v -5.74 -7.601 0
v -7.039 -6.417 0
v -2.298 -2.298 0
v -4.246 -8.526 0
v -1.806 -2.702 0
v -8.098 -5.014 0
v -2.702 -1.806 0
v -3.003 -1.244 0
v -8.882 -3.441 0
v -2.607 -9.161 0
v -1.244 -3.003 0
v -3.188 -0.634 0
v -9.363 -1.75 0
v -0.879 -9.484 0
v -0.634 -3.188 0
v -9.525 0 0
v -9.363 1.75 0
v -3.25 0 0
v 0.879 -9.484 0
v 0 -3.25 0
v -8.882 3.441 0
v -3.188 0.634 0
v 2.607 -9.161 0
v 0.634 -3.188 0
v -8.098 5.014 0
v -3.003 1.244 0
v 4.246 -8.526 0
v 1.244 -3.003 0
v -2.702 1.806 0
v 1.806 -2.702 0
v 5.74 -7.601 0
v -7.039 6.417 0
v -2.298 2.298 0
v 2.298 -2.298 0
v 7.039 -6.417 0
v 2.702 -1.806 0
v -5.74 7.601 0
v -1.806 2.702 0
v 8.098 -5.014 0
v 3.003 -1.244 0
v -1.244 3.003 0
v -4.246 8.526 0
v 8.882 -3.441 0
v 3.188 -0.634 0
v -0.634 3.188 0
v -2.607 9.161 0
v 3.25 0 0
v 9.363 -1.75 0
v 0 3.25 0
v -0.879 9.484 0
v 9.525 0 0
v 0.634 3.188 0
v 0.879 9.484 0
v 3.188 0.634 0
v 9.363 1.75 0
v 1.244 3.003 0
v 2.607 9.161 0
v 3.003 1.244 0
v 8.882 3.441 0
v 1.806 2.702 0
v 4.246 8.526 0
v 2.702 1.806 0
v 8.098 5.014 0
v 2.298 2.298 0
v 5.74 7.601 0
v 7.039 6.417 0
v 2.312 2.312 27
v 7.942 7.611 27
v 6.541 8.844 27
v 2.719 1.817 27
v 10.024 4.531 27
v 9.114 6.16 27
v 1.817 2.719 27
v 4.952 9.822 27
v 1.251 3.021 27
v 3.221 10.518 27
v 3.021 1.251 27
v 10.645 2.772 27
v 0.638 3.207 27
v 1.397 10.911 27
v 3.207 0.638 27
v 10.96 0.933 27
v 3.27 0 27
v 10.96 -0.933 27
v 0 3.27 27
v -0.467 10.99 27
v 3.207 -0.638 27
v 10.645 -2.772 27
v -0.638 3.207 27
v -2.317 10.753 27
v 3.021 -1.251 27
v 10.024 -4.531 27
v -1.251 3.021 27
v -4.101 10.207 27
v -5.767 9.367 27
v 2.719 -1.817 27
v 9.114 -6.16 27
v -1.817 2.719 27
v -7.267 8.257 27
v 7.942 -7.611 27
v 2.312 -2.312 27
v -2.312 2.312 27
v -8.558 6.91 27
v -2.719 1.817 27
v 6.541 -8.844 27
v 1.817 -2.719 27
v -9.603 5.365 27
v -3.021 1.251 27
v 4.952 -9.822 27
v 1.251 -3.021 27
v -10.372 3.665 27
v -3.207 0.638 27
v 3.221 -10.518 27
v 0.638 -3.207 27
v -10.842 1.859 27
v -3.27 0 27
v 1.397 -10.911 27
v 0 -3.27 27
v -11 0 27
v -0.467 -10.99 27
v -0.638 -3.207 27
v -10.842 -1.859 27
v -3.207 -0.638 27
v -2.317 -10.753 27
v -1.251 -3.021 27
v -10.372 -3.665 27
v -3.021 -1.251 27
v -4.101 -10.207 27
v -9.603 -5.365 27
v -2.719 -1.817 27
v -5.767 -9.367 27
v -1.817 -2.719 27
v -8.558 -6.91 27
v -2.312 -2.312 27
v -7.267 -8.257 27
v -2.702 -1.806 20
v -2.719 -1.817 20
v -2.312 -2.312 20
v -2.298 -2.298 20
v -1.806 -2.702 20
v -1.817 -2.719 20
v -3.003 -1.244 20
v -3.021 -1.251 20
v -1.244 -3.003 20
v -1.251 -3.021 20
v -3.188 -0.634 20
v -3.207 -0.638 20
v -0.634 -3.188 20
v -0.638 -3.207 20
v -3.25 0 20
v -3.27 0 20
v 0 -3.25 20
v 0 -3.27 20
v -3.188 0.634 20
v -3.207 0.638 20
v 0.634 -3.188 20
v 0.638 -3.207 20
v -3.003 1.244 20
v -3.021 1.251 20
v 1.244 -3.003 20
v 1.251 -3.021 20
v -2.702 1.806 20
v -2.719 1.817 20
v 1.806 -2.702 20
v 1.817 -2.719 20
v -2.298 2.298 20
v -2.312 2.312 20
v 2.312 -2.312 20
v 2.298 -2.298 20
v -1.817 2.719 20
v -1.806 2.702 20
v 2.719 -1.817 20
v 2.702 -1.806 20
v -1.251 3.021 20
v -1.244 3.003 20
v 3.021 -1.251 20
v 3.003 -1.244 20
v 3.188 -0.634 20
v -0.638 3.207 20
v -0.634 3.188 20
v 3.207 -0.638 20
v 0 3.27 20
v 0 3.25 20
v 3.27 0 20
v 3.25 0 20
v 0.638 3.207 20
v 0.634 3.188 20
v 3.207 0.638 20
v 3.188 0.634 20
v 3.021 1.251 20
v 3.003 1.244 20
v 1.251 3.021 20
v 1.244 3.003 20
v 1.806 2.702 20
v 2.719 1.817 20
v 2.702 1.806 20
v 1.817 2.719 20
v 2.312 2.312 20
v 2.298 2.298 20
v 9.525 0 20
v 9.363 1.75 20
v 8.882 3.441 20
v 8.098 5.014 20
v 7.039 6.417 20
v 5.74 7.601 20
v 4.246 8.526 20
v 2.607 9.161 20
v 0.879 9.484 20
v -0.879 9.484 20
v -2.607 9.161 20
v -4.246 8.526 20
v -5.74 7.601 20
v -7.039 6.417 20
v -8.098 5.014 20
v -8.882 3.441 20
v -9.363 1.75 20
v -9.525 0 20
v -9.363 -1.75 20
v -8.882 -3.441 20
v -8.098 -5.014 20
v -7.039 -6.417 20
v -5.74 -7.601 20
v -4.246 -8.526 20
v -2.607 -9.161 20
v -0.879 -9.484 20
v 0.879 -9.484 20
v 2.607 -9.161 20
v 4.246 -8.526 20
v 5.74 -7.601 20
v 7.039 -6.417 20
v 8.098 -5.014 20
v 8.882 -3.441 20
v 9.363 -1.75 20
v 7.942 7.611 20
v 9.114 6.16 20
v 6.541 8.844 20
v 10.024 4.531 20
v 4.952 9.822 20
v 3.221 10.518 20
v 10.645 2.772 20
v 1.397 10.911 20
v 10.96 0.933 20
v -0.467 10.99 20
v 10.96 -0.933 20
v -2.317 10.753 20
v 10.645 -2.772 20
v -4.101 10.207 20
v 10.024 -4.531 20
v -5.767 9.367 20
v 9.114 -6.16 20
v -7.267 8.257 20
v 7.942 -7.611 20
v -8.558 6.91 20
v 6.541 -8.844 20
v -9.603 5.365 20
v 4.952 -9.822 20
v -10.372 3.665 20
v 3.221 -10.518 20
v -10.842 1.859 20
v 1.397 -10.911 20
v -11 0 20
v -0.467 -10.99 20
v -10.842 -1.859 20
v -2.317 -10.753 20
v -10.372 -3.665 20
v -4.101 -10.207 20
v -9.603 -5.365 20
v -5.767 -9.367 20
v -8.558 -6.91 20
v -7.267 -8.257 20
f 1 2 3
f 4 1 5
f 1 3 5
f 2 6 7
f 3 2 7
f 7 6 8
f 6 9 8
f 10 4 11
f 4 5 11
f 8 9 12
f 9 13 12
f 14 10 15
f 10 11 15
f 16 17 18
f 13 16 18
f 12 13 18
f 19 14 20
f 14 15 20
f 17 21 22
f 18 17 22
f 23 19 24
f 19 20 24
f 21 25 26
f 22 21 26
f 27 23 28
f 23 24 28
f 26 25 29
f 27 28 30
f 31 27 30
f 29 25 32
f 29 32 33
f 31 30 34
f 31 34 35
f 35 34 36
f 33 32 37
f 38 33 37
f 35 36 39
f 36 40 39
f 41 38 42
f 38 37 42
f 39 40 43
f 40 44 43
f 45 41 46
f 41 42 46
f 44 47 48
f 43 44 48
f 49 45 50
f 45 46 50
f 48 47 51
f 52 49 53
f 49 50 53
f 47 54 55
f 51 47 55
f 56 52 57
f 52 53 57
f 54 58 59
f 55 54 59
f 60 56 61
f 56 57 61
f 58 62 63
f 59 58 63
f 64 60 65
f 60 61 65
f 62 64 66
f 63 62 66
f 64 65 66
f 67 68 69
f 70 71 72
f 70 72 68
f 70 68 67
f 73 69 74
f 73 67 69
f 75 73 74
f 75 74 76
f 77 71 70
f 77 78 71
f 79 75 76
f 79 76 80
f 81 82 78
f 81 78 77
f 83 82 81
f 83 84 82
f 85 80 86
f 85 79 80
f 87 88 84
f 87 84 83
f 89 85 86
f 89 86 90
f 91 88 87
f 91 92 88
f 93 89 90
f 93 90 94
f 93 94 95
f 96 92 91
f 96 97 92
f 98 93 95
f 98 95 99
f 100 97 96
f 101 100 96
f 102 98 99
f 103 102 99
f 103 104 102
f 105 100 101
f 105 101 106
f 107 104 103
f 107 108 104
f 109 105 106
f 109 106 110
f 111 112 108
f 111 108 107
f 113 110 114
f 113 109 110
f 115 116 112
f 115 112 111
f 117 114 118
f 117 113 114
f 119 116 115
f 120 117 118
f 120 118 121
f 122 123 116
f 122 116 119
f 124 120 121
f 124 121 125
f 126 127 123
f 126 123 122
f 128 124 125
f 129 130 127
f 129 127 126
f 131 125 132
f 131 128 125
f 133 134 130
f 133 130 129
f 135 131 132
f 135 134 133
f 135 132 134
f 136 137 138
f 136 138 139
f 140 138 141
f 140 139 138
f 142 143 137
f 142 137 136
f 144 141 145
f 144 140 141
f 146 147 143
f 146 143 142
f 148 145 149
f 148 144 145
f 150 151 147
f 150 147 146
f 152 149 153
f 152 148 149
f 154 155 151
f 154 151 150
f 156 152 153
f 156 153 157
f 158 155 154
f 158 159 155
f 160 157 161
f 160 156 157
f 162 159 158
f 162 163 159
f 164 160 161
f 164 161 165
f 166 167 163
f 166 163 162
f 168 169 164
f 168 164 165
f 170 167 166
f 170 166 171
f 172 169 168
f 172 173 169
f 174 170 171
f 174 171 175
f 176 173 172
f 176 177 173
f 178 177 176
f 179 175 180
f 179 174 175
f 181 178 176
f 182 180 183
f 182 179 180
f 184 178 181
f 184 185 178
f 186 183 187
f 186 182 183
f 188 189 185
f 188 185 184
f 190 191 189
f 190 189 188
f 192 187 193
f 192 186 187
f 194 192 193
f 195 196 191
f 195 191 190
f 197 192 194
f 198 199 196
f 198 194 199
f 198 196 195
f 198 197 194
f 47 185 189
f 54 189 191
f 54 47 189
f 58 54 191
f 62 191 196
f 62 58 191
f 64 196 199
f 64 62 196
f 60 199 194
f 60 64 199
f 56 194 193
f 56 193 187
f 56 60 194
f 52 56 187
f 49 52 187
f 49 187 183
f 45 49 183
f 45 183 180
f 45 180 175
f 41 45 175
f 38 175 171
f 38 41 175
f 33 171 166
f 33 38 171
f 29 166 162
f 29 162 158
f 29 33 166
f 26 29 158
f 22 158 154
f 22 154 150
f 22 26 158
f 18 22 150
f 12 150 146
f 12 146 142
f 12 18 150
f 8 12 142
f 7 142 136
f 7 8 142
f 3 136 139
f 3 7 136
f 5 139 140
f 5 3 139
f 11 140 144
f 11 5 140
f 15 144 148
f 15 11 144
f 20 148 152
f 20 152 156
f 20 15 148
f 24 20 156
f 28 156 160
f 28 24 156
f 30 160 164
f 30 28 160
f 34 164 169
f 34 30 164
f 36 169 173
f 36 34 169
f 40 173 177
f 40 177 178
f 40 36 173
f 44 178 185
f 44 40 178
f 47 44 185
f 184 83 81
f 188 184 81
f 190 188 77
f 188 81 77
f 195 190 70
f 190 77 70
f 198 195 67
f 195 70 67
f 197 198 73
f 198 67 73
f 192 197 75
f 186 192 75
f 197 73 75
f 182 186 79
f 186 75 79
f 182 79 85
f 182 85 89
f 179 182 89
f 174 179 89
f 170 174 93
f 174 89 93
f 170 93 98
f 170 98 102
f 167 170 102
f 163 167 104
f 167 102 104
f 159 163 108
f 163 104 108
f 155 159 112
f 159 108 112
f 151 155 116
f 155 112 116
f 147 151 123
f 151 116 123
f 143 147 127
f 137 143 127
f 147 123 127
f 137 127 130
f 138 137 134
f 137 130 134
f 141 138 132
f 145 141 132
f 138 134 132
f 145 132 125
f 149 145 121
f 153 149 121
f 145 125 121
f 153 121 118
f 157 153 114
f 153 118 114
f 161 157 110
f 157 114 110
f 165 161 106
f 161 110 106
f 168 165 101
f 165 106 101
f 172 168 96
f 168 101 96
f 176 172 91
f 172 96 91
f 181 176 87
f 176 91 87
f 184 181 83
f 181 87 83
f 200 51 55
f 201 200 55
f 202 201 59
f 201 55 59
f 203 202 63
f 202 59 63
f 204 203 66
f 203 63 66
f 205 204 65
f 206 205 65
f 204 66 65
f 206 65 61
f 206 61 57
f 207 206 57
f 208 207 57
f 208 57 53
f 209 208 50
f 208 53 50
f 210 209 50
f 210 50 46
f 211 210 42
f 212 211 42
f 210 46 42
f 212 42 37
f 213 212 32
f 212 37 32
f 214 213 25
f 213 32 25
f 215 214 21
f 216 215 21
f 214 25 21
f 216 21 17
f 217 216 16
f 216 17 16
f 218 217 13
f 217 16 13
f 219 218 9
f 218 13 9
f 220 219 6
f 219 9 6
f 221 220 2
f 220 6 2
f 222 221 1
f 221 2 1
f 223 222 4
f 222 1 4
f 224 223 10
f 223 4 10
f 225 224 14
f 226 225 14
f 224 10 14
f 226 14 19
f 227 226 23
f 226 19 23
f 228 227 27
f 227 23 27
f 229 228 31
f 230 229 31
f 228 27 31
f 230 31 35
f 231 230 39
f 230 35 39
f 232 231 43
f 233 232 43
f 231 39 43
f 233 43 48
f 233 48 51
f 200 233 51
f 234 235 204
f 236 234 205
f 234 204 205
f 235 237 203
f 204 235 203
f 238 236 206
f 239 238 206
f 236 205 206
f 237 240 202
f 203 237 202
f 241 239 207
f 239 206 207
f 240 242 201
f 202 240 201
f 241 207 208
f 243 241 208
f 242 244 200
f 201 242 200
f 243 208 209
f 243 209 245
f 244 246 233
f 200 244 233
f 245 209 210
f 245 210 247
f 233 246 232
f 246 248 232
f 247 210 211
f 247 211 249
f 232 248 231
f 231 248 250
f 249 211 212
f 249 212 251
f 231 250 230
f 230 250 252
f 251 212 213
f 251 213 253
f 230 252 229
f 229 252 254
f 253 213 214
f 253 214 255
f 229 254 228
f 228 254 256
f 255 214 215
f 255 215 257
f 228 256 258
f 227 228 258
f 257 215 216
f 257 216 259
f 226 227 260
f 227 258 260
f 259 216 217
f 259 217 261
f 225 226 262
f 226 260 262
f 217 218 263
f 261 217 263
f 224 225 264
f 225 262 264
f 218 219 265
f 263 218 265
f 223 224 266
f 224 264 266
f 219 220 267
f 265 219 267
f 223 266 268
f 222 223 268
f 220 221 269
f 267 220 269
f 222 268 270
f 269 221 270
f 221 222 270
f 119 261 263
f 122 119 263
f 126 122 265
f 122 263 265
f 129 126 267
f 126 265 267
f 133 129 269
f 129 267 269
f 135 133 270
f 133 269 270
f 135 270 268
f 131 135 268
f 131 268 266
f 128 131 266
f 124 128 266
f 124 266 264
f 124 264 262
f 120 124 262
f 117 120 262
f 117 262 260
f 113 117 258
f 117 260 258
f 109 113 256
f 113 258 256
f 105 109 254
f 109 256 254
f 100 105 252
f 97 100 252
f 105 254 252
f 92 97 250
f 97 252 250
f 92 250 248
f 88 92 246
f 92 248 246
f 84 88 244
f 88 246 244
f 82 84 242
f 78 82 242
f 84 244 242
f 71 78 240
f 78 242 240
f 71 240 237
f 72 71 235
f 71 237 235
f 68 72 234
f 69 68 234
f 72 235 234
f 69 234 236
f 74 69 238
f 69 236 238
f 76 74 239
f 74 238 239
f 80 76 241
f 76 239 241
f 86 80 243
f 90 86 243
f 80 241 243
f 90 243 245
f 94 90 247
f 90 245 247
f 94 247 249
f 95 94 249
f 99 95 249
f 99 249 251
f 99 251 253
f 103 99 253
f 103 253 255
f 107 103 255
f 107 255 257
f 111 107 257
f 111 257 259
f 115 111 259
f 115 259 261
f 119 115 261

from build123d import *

# Parameters (mm, degrees)
SKETCH1_R           = 9.525
SKETCH1_R_2         = 3.25
BOSS_EXTRUDE1_DEPTH = 20
SKETCH2_R           = 11
BOSS_EXTRUDE2_DEPTH = 7
SKETCH3_R           = 3.27
CUT_EXTRUDE1_DEPTH  = 7


with BuildPart() as part:
    # Sketch1 → Boss-Extrude1 (new body)
    with BuildSketch(Plane.XY):
        Circle(SKETCH1_R)
        Circle(SKETCH1_R_2, mode=Mode.SUBTRACT)
    extrude(amount=BOSS_EXTRUDE1_DEPTH)

    # Sketch2 → Boss-Extrude2 (add)
    with BuildSketch(Plane.XY.offset(20)):
        with Locations(Location((0, 0, 0), (0, 0, 180))):
            Circle(SKETCH2_R)
    extrude(amount=BOSS_EXTRUDE2_DEPTH)

    # Sketch3 → Cut-Extrude1 (cut)
    with BuildSketch(Plane.XY.offset(27)):
        Circle(SKETCH3_R)
    extrude(amount=-CUT_EXTRUDE1_DEPTH, mode=Mode.SUBTRACT)


solid = part.part
